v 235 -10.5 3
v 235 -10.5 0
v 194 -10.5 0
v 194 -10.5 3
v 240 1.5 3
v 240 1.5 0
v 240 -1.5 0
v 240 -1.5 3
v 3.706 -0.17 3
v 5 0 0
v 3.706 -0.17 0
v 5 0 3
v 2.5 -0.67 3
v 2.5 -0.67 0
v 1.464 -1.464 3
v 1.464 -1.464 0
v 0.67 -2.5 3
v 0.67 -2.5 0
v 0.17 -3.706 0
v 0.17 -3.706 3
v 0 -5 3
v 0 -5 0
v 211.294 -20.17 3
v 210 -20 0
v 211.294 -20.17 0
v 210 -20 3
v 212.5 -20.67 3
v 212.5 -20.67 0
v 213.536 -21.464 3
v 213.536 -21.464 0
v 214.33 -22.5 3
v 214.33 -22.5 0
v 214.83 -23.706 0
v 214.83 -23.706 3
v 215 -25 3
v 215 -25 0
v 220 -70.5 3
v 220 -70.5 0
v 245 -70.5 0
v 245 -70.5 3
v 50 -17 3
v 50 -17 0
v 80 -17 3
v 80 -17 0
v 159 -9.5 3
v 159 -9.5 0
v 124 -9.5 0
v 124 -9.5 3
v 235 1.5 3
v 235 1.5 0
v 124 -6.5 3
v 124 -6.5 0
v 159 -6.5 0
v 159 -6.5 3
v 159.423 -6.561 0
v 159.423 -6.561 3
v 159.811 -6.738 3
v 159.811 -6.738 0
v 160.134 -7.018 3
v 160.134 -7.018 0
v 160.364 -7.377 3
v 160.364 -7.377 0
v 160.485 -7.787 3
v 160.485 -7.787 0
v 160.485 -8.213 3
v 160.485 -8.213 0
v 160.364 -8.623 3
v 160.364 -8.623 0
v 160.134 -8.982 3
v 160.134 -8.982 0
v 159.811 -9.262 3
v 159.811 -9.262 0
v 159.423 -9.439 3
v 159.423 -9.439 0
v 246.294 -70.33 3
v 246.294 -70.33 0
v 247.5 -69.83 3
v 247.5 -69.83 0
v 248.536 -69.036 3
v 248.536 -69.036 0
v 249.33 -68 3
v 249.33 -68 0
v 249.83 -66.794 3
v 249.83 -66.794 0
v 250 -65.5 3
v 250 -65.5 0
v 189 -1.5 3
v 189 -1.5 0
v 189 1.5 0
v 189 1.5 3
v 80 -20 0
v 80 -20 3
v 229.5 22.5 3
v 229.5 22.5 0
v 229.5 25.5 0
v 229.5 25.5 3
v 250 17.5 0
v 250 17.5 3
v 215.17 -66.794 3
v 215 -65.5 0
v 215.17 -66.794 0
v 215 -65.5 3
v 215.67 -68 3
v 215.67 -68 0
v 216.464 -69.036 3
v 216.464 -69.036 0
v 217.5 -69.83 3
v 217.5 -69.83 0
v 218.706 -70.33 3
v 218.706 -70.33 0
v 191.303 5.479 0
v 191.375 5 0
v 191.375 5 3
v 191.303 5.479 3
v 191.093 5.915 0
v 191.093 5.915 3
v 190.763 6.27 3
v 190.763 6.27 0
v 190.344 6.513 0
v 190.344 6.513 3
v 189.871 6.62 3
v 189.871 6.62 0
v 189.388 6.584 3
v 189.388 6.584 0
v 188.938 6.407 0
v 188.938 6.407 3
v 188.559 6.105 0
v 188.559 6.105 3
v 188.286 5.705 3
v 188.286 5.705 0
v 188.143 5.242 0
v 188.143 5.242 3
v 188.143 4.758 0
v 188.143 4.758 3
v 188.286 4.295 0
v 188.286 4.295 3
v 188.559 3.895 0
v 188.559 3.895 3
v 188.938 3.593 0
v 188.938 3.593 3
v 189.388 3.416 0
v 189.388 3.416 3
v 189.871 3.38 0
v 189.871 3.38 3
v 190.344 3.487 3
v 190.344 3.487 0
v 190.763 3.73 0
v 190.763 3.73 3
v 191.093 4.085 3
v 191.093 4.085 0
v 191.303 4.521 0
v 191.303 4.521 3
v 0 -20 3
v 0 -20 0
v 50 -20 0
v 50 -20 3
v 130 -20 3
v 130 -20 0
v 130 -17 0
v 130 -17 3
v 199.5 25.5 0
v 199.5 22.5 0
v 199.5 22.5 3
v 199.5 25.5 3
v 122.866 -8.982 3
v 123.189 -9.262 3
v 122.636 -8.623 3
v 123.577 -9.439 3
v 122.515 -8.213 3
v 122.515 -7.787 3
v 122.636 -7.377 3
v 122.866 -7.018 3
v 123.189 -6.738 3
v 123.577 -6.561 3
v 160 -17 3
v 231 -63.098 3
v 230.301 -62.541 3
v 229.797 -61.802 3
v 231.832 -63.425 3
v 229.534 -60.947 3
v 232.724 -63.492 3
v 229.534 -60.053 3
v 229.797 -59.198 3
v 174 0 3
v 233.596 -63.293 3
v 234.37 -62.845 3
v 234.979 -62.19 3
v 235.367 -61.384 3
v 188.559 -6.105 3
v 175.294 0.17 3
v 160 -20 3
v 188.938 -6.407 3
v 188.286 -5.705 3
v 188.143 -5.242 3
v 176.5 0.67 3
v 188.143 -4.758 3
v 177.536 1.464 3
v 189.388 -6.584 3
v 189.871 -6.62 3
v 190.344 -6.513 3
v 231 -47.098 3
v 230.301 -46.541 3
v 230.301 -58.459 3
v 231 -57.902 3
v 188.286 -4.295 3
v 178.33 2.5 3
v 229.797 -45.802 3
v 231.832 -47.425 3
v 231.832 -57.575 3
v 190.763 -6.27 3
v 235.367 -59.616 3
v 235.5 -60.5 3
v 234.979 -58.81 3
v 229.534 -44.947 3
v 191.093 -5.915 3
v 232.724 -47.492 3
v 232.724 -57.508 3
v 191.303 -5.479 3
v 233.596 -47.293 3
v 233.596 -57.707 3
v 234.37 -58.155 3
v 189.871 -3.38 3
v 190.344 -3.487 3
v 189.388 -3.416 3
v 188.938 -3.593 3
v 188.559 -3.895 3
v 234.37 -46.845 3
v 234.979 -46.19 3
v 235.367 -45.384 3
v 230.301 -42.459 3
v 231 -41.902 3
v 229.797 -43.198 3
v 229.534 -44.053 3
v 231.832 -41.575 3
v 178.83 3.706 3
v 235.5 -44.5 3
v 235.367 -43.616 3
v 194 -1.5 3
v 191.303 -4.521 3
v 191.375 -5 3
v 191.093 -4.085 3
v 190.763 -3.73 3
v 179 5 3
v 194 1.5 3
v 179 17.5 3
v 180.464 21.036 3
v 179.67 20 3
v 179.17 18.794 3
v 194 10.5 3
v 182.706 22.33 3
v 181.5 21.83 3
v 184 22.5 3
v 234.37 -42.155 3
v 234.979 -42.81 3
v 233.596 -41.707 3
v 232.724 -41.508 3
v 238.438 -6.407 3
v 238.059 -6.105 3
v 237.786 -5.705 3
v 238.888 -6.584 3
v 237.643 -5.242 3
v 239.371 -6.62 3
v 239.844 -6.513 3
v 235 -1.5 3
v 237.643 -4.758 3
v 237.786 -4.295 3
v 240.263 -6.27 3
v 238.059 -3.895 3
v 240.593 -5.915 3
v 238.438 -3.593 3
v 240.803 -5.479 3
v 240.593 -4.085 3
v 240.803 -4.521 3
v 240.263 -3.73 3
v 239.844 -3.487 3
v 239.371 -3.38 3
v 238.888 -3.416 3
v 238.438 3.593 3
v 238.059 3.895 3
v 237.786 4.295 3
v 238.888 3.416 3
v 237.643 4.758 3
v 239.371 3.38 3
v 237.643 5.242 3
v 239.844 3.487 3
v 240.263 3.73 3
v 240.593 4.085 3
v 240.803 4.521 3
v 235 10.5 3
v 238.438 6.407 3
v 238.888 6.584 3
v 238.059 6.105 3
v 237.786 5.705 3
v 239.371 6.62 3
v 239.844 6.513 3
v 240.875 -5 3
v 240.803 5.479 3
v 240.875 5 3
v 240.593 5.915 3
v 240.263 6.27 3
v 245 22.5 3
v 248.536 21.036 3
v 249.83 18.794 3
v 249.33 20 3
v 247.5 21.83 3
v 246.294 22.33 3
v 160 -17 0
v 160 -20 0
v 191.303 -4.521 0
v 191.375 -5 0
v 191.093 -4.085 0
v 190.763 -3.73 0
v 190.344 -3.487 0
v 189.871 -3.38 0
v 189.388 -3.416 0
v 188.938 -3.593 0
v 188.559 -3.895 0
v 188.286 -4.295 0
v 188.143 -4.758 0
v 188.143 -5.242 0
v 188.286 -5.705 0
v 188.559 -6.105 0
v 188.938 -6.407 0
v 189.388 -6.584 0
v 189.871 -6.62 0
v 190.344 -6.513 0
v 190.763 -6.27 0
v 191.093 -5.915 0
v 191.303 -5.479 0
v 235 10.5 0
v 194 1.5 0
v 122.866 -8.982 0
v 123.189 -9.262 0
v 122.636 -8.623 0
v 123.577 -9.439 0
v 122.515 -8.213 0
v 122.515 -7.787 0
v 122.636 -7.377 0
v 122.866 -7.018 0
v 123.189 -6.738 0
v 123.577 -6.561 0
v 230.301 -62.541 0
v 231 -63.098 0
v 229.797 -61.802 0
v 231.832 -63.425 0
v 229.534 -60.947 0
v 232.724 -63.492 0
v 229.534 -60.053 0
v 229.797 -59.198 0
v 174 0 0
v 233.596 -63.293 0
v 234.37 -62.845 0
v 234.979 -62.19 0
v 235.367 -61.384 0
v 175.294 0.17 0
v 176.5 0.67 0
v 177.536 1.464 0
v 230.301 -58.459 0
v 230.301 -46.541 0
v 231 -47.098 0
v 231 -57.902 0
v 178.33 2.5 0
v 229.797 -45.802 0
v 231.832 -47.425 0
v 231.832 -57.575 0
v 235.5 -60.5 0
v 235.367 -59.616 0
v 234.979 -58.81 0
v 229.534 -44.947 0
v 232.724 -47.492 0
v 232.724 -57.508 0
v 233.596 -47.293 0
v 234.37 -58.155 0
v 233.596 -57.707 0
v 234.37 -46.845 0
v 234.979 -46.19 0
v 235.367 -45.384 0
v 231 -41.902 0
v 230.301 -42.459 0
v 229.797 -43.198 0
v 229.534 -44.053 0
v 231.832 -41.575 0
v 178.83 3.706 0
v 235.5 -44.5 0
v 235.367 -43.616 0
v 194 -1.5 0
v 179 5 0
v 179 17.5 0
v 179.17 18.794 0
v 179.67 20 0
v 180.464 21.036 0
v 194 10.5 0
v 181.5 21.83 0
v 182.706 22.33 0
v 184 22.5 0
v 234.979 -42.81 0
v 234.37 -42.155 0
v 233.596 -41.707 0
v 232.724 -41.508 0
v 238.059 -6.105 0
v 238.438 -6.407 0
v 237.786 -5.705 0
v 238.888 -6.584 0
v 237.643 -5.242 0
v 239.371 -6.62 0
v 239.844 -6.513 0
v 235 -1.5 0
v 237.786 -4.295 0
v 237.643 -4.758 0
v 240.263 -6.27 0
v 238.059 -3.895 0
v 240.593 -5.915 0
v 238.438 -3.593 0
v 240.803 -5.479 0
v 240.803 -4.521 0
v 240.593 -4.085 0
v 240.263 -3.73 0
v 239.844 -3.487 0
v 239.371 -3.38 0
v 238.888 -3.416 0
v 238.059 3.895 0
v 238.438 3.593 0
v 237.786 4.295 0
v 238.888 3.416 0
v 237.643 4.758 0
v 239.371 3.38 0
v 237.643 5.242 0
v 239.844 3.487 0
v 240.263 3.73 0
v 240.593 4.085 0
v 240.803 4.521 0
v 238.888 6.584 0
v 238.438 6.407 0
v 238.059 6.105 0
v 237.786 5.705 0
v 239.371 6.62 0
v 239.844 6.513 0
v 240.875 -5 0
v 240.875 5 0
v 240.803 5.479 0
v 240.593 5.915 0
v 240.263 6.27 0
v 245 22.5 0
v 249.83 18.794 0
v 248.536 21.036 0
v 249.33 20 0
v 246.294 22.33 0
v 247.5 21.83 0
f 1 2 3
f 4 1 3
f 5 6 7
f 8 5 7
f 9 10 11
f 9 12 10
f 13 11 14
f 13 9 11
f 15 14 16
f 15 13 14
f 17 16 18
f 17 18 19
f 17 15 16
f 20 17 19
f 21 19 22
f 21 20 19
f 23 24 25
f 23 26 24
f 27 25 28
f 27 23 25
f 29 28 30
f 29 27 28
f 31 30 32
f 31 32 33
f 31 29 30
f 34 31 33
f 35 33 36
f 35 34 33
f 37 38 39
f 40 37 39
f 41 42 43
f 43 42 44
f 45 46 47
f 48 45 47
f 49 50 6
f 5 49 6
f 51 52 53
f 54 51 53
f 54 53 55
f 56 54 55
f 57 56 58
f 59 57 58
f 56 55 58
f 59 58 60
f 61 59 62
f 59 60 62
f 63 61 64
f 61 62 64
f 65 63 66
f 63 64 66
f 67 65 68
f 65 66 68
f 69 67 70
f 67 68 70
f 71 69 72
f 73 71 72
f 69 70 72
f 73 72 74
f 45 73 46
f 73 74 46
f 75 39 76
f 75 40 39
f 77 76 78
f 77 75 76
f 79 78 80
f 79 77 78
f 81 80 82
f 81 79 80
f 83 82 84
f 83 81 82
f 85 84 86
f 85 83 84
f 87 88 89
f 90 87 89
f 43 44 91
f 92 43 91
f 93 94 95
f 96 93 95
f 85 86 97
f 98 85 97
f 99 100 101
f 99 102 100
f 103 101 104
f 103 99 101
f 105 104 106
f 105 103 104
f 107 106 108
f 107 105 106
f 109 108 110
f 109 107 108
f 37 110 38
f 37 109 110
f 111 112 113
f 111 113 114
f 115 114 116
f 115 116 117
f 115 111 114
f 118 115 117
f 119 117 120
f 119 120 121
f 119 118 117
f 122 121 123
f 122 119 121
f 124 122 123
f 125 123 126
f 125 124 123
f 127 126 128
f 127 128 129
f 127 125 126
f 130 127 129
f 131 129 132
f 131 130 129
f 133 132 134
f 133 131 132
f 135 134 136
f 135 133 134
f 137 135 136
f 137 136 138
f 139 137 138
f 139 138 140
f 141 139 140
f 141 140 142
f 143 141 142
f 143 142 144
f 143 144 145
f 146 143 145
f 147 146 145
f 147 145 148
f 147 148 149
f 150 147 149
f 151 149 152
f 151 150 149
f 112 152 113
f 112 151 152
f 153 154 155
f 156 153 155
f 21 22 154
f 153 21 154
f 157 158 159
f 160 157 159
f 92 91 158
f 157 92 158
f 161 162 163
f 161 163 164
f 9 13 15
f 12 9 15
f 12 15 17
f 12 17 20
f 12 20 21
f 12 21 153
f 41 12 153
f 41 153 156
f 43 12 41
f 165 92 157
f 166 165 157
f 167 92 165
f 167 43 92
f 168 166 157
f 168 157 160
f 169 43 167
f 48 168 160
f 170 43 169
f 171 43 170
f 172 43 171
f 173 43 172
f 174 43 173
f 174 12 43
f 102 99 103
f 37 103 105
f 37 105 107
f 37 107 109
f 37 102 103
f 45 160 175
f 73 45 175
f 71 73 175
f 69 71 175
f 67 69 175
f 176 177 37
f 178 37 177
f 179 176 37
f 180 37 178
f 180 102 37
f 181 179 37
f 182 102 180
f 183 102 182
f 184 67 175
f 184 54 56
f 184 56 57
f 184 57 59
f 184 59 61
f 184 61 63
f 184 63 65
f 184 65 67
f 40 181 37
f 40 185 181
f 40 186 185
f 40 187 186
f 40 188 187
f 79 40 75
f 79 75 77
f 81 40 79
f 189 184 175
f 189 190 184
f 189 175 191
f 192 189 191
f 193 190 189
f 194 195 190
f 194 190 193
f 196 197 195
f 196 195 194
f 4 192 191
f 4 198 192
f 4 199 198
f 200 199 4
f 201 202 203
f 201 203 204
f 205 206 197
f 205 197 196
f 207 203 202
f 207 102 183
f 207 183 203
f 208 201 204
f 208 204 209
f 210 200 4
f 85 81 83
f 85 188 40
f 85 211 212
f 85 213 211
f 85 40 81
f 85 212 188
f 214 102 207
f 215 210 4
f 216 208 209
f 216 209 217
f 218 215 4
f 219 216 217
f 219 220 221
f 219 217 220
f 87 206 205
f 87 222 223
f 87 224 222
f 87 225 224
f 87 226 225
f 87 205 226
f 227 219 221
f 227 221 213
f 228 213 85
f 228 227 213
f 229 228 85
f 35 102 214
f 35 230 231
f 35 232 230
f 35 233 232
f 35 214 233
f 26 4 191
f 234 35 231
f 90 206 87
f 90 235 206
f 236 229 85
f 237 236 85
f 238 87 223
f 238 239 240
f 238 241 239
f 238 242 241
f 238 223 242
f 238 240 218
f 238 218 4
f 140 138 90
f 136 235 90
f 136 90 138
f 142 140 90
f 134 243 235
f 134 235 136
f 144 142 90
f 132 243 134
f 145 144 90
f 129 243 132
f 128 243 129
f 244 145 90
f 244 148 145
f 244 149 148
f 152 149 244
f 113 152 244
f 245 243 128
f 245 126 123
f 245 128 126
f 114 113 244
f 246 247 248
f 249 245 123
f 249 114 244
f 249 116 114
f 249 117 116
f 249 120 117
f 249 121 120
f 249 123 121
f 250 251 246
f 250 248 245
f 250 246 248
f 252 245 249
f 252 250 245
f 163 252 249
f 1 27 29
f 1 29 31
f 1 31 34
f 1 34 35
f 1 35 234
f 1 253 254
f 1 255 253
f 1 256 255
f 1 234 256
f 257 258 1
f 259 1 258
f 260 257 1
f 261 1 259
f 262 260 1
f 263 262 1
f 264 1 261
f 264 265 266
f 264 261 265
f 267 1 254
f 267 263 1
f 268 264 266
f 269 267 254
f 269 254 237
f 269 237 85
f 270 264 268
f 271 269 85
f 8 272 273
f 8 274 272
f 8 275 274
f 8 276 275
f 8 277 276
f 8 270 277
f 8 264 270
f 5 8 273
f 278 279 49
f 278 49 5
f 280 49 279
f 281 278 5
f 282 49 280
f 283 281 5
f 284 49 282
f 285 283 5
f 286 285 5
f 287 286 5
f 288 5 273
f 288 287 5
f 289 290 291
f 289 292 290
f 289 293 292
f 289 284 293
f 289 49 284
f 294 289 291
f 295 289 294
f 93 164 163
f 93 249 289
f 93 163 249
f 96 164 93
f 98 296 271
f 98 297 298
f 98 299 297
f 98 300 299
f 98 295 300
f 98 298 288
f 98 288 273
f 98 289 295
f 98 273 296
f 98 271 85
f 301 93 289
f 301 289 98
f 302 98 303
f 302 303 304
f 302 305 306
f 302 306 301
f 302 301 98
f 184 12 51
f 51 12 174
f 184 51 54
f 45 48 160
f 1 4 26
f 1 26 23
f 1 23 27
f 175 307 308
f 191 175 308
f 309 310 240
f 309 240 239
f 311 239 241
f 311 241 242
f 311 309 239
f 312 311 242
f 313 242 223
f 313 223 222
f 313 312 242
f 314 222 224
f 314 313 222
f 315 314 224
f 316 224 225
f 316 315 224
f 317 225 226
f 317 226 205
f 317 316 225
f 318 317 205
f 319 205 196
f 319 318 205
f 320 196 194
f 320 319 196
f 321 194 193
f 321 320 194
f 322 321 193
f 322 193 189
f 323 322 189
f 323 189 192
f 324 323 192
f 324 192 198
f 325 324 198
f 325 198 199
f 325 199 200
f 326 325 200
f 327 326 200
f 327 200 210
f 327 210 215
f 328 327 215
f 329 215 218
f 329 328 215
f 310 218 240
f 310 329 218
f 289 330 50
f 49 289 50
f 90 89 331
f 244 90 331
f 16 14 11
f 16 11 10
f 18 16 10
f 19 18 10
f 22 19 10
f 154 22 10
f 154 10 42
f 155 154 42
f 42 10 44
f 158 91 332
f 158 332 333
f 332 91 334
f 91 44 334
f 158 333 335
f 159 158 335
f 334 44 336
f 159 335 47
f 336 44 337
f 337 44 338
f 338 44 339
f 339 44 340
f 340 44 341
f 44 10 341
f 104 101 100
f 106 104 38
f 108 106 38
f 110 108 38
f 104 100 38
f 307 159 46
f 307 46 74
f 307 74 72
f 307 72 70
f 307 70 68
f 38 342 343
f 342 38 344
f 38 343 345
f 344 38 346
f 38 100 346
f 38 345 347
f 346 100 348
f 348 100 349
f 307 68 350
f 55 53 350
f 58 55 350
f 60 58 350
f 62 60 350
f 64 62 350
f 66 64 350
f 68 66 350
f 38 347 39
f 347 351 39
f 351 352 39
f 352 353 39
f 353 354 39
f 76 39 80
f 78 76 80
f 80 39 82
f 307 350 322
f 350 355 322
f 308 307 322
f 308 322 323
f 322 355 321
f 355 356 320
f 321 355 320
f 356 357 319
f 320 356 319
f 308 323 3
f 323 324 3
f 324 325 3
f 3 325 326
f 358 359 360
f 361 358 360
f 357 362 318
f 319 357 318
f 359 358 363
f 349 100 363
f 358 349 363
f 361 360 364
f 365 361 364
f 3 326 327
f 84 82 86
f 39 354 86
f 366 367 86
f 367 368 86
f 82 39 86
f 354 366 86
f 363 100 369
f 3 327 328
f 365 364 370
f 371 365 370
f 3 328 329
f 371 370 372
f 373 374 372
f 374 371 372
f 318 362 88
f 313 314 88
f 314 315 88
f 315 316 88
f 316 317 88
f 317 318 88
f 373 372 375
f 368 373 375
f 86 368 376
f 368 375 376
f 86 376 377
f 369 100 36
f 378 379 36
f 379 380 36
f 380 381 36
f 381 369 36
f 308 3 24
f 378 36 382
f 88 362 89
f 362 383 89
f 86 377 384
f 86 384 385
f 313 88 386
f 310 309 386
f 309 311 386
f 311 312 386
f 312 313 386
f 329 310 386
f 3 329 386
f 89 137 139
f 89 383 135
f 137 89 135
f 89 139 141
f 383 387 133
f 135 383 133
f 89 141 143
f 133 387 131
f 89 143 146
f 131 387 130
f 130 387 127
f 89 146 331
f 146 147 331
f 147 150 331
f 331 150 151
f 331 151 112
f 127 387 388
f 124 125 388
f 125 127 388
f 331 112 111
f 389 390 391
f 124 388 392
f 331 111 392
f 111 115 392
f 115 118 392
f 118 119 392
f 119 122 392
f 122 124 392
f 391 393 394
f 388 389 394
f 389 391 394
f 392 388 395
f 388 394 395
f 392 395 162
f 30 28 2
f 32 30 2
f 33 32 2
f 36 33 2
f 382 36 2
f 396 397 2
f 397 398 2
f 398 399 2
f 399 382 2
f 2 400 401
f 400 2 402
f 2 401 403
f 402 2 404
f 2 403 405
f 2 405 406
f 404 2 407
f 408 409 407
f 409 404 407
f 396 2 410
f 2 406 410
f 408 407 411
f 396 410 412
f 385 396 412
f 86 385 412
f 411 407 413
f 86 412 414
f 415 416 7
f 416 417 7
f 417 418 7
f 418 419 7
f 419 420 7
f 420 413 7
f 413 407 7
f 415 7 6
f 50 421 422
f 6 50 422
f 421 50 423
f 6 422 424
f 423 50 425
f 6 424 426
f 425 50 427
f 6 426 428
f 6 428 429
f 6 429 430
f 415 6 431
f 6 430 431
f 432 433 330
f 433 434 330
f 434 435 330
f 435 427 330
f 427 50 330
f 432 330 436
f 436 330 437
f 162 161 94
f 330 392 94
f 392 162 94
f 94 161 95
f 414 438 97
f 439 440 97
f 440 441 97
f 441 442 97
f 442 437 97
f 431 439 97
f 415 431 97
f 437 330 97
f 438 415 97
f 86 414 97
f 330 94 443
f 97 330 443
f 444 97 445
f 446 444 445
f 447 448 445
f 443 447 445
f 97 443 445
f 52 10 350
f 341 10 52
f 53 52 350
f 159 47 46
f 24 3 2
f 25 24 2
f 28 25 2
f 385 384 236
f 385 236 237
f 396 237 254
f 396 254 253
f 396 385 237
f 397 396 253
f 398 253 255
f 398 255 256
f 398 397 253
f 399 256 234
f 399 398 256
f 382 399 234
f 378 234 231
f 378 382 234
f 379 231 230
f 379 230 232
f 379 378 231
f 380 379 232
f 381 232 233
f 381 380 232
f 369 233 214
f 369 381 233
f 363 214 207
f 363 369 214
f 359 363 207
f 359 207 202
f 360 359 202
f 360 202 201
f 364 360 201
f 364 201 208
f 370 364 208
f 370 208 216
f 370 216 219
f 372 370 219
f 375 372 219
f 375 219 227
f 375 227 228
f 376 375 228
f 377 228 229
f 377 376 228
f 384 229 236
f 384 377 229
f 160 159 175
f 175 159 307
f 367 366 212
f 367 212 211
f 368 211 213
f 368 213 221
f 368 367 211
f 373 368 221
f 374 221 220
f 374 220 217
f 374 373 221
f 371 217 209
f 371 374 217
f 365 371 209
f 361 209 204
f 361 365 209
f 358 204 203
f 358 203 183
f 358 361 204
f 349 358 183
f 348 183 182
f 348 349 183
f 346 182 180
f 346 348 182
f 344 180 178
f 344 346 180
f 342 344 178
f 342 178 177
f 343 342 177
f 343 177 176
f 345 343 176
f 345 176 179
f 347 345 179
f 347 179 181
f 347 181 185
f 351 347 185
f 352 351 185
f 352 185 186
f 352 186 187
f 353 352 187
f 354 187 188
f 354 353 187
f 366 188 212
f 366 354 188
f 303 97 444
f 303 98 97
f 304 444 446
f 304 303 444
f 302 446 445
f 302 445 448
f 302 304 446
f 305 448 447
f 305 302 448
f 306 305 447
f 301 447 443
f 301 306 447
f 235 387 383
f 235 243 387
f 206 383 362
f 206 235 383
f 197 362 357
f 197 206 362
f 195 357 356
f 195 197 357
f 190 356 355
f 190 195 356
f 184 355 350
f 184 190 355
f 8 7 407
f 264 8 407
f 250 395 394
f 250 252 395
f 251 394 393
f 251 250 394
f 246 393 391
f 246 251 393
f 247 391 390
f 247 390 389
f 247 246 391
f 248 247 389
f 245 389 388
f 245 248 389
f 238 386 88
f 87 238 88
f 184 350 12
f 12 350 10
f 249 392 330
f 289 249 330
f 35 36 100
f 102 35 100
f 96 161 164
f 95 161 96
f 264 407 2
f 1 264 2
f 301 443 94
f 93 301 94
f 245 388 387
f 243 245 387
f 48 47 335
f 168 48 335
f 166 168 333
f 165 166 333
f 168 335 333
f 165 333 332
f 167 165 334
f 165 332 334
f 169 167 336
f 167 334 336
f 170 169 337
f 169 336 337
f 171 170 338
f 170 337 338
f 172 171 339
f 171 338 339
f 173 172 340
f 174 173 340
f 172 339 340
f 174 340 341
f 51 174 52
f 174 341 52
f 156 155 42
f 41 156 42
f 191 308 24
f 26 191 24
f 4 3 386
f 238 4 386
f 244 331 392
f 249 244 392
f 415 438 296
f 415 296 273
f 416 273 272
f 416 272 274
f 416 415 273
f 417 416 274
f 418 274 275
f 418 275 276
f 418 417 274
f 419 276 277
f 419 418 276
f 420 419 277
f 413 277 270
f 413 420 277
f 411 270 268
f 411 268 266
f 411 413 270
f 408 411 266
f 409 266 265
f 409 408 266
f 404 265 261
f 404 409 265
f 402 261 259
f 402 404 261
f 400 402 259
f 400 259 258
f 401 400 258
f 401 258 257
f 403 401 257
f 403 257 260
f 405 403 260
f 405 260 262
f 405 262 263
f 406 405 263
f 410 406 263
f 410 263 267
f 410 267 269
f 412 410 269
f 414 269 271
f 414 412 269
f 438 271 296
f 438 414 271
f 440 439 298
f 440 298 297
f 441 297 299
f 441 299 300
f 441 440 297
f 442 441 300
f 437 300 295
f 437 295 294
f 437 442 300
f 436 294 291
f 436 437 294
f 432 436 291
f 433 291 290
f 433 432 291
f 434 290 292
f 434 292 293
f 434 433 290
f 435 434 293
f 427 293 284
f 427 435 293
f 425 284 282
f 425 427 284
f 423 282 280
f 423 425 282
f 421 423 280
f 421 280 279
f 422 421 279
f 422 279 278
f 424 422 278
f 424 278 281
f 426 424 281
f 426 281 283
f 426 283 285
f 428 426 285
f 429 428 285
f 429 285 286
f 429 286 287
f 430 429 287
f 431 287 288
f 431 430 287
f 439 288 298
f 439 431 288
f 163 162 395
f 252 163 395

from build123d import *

# Parameters (mm, degrees)
ESBO_O1_R                = 3
ESBO_O1_R_2              = 1.625
ESBO_O1_W                = 30
ESBO_O1_H                = 3
RESSALTO_EXTRUS_O1_DEPTH = 3
FILETE1_R                = 5


with BuildPart() as part:
    # Esboço1 → Ressalto-extrusão1 (new body)
    with BuildSketch(Plane.XY):
        Polygon((160, -20), (215, -20), (215, -70.5), (250, -70.5), (250, -20), (250, 22.5), (229.5, 22.5), (199.5, 22.5), (179, 22.5), (179, 0), (0, 0), (0, -20), (50, -20), (50, -17), (80, -17), (80, -20), (130, -20), (130, -17), (160, -17), align=None)
        with Locations((232.5, -60.5)):
            Circle(ESBO_O1_R, mode=Mode.SUBTRACT)
        with Locations((232.5, -44.5)):
            Circle(ESBO_O1_R, mode=Mode.SUBTRACT)
        with BuildLine():
            ThreePointArc((124, -9.5), (122.5, -8), (124, -6.5))
            Line((124, -6.5), (159, -6.5))
            ThreePointArc((159, -6.5), (160.5, -8), (159, -9.5))
            Line((159, -9.5), (124, -9.5))
        make_face(mode=Mode.SUBTRACT)
        with Locations((189.75, -5)):
            Circle(ESBO_O1_R_2, mode=Mode.SUBTRACT)
        Polygon((194, 1.5), (194, 10.5), (235, 10.5), (235, 1.5), (240, 1.5), (240, -1.5), (235, -1.5), (235, -10.5), (194, -10.5), (194, -1.5), (189, -1.5), (189, 1.5), align=None, mode=Mode.SUBTRACT)
        with Locations((239.25, -5)):
            Circle(ESBO_O1_R_2, mode=Mode.SUBTRACT)
        with Locations((189.75, 5)):
            Circle(ESBO_O1_R_2, mode=Mode.SUBTRACT)
        with Locations((239.25, 5)):
            Circle(ESBO_O1_R_2, mode=Mode.SUBTRACT)
        with Locations((214.5, 24)):
            Rectangle(ESBO_O1_W, ESBO_O1_H)
    extrude(amount=RESSALTO_EXTRUS_O1_DEPTH)

    # Filete1
    filete1_edges = [part.edges().sort_by_distance(p)[0] for p in [
        (250, 22.5, 1.5),
        (250, -70.5, 1.5),
        (215, -70.5, 1.5),
        (215, -20, 1.5),
        (0, 0, 1.5),
        (179, 0, 1.5),
        (179, 22.5, 1.5),
    ]]
    fillet(filete1_edges, radius=FILETE1_R)


solid = part.part
